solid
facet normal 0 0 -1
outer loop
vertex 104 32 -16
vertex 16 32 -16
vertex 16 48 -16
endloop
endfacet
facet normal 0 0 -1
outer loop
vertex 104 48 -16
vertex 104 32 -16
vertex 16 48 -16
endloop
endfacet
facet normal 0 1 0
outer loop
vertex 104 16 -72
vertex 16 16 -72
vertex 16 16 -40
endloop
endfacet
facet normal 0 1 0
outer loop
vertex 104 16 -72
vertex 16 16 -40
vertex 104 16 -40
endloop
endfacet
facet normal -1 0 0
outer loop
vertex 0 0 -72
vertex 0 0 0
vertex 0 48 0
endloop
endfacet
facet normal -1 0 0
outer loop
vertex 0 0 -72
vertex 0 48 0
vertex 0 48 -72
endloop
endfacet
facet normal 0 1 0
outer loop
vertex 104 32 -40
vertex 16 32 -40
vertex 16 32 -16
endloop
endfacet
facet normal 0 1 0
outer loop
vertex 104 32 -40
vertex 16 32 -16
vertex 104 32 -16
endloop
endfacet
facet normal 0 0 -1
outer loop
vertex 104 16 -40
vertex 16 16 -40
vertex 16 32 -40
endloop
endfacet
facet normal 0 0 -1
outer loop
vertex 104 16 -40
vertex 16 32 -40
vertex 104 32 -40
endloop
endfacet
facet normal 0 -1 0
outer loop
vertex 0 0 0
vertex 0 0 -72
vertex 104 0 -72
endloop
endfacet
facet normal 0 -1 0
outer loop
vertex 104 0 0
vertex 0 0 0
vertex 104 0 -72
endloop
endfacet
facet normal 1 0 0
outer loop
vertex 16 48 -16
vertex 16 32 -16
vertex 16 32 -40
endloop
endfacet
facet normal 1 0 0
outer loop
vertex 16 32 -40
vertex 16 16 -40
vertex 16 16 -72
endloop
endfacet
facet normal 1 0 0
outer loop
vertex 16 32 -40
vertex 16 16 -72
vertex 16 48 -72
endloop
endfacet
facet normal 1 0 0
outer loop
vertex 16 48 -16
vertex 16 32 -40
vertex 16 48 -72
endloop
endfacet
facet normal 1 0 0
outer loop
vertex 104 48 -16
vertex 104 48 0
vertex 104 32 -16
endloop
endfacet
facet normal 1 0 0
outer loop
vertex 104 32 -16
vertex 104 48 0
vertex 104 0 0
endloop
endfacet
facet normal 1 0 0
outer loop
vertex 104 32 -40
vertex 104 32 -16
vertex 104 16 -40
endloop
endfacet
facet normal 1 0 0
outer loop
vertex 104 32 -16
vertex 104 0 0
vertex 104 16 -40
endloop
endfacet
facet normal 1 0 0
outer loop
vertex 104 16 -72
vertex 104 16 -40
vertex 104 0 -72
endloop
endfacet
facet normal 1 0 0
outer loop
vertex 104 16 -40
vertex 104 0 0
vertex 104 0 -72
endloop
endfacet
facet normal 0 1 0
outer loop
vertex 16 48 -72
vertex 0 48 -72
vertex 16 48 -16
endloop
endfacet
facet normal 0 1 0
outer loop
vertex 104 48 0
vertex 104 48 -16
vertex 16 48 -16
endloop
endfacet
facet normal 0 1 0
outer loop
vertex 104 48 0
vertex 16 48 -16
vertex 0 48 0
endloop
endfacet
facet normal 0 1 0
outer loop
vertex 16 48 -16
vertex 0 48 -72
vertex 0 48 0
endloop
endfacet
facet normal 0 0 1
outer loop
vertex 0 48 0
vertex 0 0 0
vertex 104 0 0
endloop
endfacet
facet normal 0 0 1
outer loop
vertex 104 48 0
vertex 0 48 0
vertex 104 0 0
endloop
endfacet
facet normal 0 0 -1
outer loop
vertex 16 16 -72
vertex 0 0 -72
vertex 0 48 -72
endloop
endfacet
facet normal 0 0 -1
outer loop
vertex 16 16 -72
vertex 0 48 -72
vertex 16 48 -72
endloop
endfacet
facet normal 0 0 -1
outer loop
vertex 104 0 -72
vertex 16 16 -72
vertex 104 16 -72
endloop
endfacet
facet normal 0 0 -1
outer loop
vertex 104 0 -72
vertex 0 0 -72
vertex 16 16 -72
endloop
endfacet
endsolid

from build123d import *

# Parameters (mm, degrees)
SKETCH1_W           = 104
SKETCH1_H           = 72
BOSS_EXTRUDE1_DEPTH = 16
SKETCH3_W           = 16
SKETCH3_H           = 48
BOSS_EXTRUDE2_DEPTH = 104
SKETCH6_W           = 16
SKETCH6_H           = 48
BOSS_EXTRUDE3_DEPTH = 72
SKETCH7_W           = 88
SKETCH7_H           = 24
BOSS_EXTRUDE4_DEPTH = 16


with BuildPart() as part:
    # Sketch1 → Boss-Extrude1 (new body)
    with BuildSketch(Plane(origin=(0, 0, 0), x_dir=(1, 0, 0), z_dir=(0, 1, 0))):
        with Locations((52, 36)):
            Rectangle(SKETCH1_W, SKETCH1_H)
    extrude(amount=BOSS_EXTRUDE1_DEPTH)

    # Sketch3 → Boss-Extrude2 (add)
    with BuildSketch(Plane.ZY):
        with Locations((-8, 24)):
            Rectangle(SKETCH3_W, SKETCH3_H)
    extrude(amount=-BOSS_EXTRUDE2_DEPTH)

    # Sketch6 → Boss-Extrude3 (add)
    with BuildSketch(Plane(origin=(0, 0, -72), x_dir=(-1, 0, 0), z_dir=(0, 0, -1))):
        with Locations((-8, 24)):
            Rectangle(SKETCH6_W, SKETCH6_H)
    extrude(amount=-BOSS_EXTRUDE3_DEPTH)

    # Sketch7 → Boss-Extrude4 (add)
    with BuildSketch(Plane(origin=(0, 16, 0), x_dir=(1, 0, 0), z_dir=(0, 1, 0))):
        with Locations((60, 28)):
            Rectangle(SKETCH7_W, SKETCH7_H)
    extrude(amount=BOSS_EXTRUDE4_DEPTH)


solid = part.part
